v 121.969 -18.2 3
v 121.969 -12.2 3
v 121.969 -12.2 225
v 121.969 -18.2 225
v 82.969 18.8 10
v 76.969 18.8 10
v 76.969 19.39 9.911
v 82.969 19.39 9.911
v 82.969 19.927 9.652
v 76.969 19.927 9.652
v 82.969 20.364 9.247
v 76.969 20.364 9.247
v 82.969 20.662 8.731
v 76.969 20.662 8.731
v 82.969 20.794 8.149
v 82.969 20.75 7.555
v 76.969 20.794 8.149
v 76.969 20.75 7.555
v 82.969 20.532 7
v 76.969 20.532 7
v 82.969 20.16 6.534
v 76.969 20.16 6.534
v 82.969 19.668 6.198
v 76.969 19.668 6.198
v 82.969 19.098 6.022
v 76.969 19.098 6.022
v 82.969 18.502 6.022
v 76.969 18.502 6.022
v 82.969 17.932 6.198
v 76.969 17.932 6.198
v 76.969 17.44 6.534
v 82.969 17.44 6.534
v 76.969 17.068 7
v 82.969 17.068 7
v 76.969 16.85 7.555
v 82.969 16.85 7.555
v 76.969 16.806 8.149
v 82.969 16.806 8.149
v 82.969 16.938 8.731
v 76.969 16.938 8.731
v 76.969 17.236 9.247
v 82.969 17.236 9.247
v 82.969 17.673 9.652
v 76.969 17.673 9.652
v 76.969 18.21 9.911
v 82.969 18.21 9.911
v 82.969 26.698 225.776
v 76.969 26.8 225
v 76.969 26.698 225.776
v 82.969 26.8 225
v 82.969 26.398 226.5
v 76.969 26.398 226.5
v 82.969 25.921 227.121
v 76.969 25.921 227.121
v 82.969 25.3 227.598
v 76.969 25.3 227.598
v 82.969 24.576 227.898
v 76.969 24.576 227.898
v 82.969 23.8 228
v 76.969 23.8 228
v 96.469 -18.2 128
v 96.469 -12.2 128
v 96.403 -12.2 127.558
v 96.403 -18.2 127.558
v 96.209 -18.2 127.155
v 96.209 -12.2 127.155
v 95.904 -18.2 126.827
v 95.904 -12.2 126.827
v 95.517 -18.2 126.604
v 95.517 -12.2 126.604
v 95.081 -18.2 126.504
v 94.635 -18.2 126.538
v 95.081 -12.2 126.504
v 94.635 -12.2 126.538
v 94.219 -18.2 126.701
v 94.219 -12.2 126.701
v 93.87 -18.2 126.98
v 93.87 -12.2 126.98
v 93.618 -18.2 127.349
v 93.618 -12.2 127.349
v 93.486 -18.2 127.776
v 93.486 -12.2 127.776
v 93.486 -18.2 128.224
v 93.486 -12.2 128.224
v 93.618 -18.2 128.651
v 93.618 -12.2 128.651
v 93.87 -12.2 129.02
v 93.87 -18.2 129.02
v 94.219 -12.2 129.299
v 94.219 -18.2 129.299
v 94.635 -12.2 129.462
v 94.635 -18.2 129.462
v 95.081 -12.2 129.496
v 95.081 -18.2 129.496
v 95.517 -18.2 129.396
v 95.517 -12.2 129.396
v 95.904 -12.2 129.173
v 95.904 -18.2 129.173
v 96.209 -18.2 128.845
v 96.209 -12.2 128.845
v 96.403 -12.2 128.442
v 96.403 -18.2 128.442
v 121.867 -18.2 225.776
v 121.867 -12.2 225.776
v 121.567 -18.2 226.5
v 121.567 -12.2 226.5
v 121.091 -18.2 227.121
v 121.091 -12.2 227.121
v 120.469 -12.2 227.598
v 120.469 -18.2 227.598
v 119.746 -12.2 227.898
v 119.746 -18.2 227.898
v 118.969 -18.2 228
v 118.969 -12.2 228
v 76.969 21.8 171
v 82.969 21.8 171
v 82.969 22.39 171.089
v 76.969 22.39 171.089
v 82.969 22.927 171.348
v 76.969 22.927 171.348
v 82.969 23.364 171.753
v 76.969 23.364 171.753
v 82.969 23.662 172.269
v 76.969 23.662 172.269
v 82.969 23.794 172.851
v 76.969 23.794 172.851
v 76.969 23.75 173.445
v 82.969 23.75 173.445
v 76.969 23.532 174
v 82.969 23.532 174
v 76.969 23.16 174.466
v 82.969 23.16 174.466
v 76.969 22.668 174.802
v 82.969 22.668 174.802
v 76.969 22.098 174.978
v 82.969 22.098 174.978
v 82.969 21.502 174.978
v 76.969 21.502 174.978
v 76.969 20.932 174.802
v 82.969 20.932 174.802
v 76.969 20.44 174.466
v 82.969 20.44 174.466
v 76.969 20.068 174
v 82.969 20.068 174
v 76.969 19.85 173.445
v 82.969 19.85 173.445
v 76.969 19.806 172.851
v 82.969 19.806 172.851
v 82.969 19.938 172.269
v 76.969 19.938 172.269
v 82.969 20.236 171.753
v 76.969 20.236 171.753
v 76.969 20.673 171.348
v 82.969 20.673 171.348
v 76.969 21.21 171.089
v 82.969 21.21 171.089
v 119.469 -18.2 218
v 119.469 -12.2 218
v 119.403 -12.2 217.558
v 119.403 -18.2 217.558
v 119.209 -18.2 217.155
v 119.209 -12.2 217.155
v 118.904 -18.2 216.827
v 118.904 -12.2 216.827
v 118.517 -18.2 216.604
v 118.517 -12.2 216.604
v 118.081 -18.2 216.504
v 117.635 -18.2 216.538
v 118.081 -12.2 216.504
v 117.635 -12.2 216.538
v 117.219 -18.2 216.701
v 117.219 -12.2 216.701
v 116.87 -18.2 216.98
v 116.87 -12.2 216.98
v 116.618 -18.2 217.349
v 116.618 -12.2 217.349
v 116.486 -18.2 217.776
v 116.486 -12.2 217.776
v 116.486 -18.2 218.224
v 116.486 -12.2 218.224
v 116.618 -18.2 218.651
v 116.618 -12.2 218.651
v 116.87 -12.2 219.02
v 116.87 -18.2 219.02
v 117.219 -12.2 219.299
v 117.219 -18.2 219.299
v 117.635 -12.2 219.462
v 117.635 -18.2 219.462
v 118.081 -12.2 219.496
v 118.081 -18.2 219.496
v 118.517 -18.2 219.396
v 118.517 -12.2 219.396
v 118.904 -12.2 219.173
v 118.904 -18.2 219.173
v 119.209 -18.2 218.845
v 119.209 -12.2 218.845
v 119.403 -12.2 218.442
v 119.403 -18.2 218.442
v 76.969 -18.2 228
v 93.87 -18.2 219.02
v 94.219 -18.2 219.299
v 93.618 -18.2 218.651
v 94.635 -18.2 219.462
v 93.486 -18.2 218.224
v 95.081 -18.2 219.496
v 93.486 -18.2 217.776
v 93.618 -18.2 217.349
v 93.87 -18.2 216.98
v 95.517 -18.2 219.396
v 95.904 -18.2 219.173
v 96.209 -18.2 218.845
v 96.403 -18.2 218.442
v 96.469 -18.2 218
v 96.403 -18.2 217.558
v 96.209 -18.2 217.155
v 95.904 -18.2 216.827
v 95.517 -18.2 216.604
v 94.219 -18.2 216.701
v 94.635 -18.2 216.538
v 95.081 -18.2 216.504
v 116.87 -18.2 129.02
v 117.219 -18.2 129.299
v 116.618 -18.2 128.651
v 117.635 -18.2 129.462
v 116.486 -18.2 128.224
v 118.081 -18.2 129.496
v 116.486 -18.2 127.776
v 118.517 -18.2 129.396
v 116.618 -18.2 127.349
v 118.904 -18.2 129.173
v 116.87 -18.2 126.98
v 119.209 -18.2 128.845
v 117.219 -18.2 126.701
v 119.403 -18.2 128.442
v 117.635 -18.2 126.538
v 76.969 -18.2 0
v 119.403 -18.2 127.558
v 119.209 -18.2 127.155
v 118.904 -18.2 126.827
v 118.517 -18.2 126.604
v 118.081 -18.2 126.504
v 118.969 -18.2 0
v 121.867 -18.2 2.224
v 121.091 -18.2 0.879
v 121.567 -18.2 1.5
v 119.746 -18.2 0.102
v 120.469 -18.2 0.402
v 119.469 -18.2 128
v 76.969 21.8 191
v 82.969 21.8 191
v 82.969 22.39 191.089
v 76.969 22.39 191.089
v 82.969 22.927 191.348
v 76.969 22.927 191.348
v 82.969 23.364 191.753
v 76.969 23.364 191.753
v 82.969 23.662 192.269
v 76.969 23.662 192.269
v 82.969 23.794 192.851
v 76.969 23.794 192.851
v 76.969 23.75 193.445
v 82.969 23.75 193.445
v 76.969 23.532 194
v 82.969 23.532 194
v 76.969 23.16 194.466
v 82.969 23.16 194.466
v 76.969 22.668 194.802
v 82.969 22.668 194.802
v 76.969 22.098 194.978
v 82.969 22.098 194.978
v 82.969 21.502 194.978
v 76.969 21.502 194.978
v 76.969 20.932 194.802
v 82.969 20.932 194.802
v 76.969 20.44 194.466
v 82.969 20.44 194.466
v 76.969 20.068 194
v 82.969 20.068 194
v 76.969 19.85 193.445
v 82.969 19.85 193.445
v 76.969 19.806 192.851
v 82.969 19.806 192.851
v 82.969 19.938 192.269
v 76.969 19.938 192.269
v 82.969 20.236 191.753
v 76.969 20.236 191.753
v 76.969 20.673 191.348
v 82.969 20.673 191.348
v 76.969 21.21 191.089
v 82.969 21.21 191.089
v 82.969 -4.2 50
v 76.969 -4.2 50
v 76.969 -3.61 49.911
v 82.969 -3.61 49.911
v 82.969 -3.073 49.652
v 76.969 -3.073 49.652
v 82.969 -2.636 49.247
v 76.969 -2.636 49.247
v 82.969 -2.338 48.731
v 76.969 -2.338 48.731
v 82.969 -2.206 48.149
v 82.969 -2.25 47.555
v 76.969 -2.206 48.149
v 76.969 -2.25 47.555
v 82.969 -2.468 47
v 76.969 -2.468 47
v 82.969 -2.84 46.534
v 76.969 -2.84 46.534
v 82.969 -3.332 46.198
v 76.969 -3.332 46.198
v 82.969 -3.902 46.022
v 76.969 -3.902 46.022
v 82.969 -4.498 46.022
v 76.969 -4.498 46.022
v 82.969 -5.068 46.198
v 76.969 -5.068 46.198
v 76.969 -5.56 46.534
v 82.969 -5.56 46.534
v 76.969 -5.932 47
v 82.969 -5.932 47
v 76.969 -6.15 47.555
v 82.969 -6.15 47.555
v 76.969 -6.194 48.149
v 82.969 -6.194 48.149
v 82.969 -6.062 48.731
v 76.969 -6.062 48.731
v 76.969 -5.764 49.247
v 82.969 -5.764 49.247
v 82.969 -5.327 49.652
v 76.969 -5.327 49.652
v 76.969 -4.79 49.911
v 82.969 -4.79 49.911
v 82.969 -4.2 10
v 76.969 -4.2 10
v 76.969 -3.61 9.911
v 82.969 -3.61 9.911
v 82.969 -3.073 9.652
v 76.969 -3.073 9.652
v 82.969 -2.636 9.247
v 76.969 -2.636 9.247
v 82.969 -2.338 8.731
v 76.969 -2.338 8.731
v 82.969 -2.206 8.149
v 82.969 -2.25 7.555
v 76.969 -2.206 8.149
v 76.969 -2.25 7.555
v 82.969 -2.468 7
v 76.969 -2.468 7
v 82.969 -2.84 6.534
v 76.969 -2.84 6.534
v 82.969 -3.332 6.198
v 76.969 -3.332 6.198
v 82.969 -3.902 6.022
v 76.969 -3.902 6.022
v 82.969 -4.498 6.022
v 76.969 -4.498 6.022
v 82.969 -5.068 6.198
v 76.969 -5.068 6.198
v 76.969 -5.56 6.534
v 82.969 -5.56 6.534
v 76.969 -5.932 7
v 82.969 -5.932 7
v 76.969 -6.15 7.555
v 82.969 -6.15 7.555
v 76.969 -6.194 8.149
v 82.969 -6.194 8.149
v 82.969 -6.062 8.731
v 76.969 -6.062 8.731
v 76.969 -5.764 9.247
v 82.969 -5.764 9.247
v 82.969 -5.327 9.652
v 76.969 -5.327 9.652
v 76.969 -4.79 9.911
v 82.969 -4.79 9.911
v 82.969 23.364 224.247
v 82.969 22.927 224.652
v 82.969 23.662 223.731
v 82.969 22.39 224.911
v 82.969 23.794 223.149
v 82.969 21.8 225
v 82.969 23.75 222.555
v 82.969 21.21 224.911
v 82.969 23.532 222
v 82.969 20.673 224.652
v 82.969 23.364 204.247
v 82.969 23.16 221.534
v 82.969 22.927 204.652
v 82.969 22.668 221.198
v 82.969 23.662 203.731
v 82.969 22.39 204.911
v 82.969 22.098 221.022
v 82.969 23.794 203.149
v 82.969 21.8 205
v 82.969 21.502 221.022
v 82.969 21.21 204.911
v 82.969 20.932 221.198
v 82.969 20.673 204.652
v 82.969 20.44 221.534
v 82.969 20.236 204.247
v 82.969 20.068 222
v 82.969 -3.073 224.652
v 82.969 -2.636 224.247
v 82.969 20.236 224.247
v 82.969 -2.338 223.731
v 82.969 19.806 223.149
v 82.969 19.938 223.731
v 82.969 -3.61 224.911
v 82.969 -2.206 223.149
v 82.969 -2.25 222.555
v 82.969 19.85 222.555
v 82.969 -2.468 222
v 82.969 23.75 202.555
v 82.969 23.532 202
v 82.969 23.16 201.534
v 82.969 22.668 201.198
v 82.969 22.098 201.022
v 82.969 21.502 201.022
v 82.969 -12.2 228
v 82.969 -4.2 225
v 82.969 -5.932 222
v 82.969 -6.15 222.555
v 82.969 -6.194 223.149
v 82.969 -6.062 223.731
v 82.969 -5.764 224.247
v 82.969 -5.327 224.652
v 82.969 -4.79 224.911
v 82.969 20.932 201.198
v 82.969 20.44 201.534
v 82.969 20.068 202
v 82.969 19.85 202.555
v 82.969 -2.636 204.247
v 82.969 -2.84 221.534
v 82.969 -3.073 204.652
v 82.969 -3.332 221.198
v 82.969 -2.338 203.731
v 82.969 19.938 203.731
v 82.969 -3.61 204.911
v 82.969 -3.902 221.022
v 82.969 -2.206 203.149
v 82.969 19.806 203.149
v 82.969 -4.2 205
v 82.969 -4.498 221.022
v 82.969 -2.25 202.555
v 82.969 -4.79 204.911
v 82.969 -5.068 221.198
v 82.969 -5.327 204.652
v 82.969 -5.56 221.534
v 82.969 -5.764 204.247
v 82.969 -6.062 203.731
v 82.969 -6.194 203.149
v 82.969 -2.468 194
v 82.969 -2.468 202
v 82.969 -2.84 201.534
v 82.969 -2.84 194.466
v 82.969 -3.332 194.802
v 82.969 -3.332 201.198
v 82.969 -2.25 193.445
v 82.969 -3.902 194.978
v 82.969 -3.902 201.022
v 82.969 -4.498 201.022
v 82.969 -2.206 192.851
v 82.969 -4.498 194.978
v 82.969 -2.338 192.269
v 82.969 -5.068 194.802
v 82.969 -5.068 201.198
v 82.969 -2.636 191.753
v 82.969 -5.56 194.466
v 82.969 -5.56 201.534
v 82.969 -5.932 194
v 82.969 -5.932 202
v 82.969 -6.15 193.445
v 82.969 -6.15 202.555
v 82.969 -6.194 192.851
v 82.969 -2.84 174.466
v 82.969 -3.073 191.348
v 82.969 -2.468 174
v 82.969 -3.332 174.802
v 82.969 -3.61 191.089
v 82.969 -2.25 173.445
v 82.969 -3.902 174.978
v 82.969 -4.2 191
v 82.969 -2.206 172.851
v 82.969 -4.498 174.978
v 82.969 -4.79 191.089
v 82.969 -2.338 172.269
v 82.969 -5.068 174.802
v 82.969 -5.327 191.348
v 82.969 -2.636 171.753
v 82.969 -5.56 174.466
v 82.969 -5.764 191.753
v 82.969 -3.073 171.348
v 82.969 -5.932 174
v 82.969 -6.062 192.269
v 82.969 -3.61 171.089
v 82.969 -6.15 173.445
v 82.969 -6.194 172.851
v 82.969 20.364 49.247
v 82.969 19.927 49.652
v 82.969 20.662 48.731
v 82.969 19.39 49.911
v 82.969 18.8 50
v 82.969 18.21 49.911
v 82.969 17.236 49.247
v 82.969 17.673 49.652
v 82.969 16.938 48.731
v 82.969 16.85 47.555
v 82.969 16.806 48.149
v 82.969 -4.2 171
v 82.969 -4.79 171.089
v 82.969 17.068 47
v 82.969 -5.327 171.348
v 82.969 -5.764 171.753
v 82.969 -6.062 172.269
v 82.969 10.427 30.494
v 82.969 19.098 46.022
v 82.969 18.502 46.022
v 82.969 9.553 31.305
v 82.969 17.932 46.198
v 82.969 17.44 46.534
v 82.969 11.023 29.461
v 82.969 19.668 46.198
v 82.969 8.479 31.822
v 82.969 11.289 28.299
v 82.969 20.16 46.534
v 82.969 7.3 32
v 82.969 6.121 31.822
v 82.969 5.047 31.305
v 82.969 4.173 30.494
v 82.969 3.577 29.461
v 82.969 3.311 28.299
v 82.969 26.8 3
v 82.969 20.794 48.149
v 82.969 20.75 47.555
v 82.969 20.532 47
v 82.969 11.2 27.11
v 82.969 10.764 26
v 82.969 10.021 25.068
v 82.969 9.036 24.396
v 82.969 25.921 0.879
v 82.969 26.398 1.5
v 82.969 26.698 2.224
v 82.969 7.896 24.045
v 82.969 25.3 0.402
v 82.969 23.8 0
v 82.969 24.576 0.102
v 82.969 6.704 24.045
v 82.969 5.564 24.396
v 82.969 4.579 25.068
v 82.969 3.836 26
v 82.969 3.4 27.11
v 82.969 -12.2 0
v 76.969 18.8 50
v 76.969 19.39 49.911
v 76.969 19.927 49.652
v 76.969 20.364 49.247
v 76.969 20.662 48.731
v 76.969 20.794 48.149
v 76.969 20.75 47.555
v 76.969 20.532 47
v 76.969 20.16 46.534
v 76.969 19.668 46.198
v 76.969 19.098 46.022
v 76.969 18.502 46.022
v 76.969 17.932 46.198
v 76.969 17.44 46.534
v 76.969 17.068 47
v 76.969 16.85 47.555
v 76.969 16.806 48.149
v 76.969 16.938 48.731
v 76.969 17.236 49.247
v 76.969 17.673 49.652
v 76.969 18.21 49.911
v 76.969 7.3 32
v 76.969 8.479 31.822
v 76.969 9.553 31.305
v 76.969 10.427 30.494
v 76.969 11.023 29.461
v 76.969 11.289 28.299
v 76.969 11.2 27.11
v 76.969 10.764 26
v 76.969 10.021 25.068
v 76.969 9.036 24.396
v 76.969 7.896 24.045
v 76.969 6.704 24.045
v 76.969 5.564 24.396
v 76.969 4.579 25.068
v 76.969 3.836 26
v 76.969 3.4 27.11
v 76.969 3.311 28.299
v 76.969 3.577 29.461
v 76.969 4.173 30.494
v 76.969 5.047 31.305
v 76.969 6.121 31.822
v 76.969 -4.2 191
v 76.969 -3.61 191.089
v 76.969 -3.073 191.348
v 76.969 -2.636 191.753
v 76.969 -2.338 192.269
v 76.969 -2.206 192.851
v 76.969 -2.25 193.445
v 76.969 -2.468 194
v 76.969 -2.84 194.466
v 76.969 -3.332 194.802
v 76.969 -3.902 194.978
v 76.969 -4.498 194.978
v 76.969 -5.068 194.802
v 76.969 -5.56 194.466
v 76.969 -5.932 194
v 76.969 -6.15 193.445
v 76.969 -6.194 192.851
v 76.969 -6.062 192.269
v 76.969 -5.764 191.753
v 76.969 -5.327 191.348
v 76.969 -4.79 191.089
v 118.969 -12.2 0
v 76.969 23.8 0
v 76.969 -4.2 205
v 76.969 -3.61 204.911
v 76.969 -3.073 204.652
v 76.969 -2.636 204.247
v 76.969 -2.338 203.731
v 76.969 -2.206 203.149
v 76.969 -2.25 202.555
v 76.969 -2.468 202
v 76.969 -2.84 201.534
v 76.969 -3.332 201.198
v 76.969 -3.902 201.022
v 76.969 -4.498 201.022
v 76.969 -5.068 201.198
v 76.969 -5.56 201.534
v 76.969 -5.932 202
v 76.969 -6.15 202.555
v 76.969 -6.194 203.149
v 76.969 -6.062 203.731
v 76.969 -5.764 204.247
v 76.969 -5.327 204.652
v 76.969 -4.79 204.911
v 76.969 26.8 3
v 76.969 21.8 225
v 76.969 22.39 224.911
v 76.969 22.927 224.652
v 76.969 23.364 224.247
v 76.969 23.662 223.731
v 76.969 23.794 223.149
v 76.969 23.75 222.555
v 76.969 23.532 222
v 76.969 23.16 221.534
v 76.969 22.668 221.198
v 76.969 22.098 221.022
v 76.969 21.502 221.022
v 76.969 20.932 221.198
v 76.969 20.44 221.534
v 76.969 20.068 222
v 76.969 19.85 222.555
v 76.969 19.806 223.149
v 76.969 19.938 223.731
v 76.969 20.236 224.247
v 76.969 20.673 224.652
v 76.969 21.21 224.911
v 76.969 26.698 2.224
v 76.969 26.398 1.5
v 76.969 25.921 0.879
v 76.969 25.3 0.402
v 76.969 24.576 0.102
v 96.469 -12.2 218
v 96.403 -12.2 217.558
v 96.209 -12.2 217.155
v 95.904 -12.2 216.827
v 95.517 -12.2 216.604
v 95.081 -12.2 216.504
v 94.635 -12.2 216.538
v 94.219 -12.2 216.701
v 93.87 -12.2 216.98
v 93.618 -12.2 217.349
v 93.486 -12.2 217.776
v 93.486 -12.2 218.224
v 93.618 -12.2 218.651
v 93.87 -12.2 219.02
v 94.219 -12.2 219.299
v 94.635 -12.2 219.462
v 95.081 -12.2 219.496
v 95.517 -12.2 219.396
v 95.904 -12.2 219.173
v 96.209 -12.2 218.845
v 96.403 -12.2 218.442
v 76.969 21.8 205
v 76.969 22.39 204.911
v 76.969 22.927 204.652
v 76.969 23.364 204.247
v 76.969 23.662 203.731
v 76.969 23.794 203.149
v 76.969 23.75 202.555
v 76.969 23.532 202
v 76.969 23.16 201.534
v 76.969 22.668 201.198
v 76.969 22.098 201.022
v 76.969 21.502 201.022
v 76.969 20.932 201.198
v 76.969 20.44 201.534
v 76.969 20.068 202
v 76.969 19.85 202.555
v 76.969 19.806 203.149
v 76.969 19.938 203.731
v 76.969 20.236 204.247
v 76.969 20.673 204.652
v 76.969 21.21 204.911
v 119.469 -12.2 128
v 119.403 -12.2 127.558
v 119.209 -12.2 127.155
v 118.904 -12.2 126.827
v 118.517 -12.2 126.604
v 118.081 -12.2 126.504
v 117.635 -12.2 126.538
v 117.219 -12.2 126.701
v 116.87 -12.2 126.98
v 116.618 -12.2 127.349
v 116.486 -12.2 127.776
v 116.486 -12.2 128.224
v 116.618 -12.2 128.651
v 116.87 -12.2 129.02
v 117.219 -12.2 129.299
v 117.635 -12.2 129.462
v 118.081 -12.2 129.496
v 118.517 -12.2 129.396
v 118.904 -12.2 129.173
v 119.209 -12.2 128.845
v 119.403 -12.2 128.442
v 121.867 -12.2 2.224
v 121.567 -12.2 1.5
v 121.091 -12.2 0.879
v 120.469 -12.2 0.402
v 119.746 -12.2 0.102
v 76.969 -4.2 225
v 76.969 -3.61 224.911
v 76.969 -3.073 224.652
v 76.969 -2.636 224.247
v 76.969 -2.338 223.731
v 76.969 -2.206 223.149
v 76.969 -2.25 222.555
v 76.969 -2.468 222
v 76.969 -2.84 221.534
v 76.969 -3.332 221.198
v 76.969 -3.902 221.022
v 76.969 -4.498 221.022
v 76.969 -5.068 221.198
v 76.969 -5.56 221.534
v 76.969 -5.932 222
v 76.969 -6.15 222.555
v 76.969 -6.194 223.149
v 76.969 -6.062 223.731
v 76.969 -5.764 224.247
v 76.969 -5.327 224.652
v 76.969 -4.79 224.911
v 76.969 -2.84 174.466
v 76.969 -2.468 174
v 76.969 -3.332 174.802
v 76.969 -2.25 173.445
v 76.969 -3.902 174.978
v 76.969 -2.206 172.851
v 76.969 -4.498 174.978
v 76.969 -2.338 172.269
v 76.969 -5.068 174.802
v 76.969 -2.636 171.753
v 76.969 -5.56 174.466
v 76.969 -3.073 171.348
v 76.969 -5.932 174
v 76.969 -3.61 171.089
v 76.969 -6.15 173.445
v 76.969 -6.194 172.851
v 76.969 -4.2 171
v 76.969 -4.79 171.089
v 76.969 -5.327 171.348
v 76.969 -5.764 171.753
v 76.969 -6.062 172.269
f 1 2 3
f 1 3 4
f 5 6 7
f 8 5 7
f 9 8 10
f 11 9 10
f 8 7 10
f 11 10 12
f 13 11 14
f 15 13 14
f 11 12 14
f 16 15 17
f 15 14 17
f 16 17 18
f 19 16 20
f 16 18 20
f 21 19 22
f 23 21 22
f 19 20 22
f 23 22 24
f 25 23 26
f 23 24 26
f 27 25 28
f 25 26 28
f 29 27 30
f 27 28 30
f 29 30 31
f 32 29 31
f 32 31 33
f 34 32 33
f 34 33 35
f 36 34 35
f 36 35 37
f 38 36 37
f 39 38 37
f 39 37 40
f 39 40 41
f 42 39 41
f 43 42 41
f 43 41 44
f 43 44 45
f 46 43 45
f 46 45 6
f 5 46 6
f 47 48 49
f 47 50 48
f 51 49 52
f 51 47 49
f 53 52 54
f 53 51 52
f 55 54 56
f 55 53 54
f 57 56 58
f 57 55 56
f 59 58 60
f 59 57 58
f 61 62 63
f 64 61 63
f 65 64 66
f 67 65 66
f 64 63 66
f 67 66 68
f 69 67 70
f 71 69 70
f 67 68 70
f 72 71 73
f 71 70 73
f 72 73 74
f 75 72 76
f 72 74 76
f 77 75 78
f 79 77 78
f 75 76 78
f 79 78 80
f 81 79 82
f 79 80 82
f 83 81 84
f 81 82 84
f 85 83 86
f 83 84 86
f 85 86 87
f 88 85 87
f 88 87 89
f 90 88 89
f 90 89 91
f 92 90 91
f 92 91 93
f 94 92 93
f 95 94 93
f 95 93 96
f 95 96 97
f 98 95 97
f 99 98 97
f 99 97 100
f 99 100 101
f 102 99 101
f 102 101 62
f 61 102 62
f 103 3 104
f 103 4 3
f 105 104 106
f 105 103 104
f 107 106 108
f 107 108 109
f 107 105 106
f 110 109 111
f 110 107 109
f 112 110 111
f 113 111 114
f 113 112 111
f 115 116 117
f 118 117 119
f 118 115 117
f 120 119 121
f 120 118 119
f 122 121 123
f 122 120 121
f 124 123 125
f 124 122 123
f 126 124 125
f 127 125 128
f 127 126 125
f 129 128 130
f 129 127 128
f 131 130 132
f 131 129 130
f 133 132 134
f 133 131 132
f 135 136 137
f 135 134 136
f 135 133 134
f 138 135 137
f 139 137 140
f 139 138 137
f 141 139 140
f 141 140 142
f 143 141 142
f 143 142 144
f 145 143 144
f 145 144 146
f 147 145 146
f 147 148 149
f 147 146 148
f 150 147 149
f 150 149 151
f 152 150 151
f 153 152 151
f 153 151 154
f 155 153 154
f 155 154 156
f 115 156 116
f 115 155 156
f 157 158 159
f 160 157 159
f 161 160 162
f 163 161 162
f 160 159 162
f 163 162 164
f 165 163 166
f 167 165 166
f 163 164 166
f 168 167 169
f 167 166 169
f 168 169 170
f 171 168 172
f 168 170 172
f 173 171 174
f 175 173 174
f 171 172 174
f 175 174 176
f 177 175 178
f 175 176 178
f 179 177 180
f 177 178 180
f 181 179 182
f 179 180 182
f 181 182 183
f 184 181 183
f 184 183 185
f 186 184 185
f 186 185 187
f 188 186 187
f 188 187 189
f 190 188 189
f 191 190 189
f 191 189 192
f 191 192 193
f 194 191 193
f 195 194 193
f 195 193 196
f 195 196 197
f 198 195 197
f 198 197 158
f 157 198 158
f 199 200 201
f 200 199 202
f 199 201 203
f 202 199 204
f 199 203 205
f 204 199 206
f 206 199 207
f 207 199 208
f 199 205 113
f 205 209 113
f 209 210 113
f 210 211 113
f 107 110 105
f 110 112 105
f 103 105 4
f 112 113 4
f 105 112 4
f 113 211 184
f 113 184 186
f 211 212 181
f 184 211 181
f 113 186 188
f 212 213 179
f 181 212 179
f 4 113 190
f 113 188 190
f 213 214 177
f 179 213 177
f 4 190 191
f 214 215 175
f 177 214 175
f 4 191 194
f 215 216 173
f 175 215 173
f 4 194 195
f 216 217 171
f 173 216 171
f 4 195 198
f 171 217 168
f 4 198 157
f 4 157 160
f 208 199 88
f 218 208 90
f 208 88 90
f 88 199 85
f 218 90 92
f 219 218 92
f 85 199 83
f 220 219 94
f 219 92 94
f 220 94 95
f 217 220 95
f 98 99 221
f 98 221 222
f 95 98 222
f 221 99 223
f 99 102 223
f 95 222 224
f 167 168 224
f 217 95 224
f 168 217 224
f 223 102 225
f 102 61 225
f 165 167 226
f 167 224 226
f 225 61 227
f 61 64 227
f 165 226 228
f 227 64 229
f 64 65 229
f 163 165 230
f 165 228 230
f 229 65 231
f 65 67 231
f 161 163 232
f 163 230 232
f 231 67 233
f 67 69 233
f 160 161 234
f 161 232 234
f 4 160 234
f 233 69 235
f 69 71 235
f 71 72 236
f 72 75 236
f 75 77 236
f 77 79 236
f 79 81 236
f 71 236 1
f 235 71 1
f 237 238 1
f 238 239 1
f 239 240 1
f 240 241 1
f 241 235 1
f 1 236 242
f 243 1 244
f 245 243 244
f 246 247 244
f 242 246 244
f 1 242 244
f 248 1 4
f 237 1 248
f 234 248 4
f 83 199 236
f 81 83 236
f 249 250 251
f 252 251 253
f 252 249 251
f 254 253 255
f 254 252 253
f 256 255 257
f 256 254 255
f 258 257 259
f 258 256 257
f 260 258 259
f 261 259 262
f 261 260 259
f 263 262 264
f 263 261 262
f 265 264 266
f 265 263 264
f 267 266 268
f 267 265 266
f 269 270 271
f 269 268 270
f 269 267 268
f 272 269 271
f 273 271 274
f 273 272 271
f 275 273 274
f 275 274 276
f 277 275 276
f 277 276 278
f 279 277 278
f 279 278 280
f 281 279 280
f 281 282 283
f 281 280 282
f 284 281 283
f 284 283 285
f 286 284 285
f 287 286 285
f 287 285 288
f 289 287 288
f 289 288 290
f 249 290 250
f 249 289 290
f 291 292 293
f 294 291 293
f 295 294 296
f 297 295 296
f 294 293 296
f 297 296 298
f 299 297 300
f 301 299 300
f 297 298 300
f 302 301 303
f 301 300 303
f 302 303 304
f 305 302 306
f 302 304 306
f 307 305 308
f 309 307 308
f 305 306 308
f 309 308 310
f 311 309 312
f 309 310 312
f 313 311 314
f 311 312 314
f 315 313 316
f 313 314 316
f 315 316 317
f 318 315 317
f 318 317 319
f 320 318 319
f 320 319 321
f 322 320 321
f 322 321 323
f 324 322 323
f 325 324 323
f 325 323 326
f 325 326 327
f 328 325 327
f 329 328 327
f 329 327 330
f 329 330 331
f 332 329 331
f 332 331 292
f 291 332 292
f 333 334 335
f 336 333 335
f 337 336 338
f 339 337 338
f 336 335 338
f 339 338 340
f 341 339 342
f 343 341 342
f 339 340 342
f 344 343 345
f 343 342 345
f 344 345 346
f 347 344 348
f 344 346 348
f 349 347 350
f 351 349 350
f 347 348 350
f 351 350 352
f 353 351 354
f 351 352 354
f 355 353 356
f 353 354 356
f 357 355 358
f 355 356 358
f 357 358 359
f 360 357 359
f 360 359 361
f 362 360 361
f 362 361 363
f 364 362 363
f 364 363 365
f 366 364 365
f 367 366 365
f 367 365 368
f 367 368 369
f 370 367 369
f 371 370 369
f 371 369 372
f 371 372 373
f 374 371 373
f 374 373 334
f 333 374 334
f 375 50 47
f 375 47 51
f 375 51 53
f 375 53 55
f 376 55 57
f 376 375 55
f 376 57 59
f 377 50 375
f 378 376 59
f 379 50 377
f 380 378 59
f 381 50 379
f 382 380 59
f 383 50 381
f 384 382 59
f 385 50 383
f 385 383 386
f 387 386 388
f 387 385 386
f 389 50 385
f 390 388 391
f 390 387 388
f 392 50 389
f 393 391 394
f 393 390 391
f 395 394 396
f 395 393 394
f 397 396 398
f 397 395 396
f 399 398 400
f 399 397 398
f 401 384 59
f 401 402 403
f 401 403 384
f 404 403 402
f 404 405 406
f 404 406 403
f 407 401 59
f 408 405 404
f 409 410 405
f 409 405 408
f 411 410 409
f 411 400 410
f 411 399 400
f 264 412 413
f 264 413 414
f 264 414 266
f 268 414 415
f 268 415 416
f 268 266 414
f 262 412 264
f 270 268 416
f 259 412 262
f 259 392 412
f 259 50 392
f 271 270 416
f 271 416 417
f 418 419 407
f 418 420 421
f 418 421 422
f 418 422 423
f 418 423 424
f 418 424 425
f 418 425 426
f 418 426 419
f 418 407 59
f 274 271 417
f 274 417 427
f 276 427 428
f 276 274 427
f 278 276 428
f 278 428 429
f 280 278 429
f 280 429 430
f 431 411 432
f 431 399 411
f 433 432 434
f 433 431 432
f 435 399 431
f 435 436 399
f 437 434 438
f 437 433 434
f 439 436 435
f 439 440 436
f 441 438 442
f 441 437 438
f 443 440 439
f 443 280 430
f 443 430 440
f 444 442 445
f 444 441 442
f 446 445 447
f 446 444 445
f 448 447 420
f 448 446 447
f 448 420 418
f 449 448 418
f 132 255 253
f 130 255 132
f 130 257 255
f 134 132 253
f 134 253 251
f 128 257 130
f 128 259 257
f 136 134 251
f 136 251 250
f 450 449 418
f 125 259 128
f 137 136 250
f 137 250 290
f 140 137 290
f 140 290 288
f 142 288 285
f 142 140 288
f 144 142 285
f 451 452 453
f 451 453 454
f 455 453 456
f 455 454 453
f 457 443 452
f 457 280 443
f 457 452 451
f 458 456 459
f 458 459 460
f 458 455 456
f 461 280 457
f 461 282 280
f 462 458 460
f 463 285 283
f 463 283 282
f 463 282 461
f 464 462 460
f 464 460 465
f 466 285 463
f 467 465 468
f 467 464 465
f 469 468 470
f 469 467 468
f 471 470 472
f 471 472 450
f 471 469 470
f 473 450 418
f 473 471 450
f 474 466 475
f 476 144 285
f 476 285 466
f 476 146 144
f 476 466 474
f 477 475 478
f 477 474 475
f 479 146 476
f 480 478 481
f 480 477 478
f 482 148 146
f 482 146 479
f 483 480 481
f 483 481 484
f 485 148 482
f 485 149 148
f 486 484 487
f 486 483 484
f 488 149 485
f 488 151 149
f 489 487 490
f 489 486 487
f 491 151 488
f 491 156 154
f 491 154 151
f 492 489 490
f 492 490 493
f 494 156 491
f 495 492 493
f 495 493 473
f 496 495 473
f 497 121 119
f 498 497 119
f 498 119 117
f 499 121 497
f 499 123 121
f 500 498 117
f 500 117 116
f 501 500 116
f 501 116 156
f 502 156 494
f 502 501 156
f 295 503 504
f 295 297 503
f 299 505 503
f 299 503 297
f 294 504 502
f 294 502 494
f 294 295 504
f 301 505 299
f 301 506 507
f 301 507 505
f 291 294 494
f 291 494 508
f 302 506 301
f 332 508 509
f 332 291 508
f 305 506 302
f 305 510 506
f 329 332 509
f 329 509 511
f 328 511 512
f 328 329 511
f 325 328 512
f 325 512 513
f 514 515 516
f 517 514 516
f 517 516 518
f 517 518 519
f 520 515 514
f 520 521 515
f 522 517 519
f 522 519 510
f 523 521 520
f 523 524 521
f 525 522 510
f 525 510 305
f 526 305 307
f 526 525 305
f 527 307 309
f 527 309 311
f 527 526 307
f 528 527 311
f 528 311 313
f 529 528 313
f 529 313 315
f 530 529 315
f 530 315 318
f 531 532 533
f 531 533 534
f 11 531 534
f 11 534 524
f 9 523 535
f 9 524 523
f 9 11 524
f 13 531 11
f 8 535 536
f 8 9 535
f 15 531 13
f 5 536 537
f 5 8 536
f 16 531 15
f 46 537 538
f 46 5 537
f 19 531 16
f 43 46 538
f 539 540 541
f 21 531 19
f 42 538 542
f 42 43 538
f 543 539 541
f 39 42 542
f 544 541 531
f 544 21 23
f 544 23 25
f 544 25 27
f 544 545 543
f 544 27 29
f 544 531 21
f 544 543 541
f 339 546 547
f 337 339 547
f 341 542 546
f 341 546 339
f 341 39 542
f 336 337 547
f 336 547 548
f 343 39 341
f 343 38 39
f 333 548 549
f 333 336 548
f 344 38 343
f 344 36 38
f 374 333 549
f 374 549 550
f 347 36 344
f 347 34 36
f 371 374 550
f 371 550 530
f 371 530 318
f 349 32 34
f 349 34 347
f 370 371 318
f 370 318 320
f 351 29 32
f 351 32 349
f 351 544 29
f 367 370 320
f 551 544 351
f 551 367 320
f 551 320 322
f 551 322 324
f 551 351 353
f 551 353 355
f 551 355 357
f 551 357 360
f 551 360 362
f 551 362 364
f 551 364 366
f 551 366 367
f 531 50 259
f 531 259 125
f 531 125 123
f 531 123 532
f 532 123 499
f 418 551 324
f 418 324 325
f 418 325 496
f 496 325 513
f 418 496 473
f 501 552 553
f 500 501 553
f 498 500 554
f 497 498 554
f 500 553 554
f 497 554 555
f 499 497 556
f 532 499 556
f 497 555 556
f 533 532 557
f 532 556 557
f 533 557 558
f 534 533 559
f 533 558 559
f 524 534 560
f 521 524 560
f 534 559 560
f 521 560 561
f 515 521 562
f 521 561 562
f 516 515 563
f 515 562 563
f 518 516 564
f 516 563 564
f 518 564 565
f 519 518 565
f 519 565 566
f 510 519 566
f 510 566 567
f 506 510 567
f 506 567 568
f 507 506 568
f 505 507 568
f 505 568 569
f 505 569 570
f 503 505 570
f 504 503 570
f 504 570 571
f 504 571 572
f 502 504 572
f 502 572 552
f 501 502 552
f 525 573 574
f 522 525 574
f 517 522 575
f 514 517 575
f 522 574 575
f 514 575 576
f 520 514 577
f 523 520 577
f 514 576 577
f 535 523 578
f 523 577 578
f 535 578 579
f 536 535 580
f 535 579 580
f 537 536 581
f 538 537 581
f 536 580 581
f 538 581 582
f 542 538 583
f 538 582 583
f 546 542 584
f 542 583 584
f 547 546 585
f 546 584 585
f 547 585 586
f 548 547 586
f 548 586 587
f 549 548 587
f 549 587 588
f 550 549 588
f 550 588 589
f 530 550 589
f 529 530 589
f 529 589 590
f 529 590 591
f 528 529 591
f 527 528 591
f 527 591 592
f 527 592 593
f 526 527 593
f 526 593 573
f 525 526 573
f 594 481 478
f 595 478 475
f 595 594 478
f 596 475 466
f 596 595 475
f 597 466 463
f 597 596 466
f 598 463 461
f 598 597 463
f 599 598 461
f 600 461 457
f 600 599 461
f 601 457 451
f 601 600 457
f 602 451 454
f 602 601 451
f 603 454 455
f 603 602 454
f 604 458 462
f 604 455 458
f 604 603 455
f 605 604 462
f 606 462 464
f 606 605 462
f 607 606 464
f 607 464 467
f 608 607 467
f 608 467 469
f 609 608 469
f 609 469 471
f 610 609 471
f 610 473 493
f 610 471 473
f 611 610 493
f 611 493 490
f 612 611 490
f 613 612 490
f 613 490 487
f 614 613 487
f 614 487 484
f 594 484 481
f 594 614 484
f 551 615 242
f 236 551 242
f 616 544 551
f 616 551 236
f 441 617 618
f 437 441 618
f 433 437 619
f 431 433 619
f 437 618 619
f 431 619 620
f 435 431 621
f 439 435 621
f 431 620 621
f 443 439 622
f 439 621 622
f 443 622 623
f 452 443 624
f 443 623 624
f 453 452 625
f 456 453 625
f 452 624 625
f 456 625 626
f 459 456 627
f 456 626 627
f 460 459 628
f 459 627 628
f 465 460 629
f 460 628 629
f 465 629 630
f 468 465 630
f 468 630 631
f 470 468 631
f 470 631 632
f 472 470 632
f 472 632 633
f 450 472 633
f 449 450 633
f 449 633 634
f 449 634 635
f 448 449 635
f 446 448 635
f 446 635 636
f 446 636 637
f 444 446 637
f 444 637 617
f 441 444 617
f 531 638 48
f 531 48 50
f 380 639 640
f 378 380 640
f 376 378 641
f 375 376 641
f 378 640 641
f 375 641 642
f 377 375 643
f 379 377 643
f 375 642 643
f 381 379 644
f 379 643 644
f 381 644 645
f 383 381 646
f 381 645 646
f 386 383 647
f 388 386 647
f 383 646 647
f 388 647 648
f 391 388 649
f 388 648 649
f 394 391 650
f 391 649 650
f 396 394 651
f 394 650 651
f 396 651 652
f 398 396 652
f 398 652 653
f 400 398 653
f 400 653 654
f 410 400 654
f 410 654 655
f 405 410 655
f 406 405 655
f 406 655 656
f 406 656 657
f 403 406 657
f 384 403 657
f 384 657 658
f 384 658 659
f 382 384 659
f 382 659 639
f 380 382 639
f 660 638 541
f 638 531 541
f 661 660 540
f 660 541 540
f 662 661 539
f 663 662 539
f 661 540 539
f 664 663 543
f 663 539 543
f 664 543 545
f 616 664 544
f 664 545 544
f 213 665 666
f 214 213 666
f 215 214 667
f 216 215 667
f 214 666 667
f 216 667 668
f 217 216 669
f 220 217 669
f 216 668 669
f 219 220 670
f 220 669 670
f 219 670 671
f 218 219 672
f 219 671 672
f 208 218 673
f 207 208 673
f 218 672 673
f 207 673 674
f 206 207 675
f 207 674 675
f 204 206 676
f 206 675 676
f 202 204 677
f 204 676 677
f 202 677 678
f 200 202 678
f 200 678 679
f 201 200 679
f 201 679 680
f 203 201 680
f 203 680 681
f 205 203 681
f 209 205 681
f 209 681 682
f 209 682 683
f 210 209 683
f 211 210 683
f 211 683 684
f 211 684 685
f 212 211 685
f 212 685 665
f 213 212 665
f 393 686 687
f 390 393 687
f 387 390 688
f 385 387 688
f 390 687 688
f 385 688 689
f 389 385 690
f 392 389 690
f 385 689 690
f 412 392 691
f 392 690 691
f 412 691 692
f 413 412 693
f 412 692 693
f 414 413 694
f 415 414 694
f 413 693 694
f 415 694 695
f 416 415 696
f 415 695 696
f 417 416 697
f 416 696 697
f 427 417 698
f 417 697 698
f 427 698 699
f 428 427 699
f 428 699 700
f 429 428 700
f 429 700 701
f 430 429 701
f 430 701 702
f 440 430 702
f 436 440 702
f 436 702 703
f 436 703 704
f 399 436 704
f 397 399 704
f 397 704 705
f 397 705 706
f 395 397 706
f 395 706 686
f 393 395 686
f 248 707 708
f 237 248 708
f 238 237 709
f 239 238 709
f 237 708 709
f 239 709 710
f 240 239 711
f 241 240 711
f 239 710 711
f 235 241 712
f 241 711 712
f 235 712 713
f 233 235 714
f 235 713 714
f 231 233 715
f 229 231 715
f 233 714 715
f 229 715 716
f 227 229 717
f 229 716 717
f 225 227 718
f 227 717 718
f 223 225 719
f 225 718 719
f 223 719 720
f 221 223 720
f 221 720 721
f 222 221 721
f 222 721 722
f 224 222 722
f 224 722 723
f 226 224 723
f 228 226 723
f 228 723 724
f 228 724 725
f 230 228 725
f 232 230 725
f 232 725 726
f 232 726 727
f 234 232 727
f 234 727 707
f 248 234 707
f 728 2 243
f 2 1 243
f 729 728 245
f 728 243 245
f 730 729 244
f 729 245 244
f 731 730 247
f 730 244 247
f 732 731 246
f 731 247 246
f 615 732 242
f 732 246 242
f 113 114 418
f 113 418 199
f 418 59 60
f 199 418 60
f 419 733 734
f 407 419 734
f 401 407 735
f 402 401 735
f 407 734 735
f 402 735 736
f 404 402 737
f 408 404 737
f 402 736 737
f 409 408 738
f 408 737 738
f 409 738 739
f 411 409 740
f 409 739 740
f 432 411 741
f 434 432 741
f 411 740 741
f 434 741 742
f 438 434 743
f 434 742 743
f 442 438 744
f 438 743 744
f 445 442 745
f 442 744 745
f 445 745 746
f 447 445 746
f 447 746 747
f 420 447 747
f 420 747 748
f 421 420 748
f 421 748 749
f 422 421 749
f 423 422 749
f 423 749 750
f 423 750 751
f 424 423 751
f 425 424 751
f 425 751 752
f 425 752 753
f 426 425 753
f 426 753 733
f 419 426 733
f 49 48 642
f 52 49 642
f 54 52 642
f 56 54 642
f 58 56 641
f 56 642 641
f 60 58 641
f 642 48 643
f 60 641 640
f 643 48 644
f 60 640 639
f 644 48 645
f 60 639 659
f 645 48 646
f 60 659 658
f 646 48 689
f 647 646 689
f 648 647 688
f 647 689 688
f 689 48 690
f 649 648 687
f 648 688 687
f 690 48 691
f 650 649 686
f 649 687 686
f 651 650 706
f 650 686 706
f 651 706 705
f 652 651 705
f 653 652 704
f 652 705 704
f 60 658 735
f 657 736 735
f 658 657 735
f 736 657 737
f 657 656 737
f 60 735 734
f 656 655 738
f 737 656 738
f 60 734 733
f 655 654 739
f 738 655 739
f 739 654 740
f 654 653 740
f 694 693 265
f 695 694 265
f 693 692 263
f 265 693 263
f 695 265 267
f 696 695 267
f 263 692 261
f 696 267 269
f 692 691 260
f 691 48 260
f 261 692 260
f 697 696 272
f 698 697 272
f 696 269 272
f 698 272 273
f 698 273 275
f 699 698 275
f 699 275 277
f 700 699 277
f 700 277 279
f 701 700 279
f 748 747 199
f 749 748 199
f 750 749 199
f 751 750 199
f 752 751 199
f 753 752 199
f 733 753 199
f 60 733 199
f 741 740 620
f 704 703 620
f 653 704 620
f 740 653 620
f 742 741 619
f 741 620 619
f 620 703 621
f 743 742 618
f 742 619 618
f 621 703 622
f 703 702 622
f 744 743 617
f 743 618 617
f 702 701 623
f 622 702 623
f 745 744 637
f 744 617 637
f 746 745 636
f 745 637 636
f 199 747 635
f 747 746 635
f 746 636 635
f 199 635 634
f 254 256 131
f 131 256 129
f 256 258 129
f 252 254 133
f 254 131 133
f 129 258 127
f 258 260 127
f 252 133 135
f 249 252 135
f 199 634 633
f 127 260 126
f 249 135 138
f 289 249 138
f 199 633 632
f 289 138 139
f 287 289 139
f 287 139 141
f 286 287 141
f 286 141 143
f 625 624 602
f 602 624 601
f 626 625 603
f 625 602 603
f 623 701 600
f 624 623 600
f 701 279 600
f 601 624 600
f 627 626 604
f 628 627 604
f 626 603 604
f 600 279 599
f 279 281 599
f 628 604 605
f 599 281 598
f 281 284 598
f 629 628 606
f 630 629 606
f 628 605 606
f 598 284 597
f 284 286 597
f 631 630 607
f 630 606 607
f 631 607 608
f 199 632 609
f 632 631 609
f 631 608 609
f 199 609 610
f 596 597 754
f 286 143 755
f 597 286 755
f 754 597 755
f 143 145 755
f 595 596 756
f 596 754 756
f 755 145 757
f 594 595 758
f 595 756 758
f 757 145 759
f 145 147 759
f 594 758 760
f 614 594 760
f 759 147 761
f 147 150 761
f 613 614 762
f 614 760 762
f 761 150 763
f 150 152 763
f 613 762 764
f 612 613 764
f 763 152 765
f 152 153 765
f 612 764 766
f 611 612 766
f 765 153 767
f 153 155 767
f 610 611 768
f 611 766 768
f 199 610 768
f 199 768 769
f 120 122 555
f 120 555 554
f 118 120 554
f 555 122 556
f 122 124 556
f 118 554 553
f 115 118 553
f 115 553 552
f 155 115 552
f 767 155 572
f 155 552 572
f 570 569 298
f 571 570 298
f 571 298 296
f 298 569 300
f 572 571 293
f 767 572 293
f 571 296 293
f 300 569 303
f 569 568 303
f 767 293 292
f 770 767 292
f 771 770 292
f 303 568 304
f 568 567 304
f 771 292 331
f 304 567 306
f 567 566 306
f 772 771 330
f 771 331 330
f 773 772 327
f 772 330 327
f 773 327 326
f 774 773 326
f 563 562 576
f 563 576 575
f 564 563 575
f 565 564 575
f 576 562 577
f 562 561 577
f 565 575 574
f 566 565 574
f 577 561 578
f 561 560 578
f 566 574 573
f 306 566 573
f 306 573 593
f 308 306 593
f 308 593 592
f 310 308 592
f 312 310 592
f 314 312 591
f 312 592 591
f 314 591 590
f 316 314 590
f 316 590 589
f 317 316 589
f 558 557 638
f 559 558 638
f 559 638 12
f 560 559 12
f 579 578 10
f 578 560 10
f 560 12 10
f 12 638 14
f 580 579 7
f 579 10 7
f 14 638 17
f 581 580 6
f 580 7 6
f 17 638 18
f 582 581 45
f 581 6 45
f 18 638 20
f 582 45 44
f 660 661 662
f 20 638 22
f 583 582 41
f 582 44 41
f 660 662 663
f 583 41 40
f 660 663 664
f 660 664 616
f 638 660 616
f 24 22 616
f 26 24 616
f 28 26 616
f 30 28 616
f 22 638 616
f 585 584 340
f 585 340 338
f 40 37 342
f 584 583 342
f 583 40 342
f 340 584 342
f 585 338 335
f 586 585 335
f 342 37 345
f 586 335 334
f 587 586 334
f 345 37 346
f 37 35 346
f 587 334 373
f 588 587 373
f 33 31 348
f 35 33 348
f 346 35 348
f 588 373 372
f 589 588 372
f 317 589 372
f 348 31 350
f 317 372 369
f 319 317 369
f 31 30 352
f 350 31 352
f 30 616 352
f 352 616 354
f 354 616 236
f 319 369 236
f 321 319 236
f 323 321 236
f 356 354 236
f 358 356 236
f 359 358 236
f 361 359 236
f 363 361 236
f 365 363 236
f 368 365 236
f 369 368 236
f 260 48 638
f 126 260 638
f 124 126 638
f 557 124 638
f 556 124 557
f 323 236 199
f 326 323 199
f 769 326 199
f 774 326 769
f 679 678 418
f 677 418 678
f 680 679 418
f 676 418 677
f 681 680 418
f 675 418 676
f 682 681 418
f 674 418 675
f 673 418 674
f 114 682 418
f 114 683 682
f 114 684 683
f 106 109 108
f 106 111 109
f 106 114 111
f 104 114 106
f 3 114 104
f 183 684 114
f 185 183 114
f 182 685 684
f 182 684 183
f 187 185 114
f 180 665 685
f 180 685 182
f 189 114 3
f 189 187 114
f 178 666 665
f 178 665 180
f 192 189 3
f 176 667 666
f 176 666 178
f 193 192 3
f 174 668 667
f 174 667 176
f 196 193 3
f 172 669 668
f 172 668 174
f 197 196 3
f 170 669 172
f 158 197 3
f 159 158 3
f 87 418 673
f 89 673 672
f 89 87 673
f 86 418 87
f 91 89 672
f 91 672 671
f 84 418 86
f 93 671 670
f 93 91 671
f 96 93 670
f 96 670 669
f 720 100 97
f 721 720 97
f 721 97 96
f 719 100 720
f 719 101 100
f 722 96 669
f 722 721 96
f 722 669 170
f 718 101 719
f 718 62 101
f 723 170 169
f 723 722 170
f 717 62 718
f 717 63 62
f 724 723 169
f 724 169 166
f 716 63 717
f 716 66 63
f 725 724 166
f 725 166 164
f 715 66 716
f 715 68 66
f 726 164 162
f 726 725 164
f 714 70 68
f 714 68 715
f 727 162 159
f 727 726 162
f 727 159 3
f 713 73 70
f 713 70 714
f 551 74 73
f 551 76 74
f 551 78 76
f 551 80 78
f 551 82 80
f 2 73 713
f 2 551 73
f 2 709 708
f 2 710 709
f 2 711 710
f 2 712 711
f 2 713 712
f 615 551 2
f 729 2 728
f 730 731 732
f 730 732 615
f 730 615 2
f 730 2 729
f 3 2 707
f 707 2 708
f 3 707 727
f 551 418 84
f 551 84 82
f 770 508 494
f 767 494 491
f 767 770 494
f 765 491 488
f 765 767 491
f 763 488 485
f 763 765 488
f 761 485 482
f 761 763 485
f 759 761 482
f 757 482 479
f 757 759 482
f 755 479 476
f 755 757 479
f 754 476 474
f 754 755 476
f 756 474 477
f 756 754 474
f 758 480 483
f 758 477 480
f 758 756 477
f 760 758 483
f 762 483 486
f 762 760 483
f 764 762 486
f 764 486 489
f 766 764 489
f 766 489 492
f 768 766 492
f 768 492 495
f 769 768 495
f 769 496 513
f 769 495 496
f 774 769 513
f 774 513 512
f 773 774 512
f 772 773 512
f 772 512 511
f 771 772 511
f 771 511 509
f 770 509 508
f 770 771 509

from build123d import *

# Parameters (mm, degrees)
BOSS_EXTRUDE1_DEPTH = 228
FILLET1_R           = 3
SKETCH5_R           = 2
CUT_EXTRUDE2_DEPTH  = 46
SKETCH6_R           = 2
CUT_EXTRUDE3_DEPTH  = 46
SKETCH7_R           = 4
CUT_EXTRUDE4_DEPTH  = 46
SKETCH8_R           = 1.5
CUT_EXTRUDE5_DEPTH  = 7


with BuildPart() as part:
    # Sketch2 → Boss-Extrude1 (new body)
    with BuildSketch(Plane.XY):
        Polygon((82.969208633, 26.8), (82.969208633, -12.2), (121.969208633, -12.2), (121.969208633, -18.2), (82.969208633, -18.2), (76.969208633, -18.2), (76.969208633, -12.2), (76.969208633, 26.8), align=None)
    extrude(amount=BOSS_EXTRUDE1_DEPTH)

    # Fillet1
    fillet1_edges = [part.edges().sort_by_distance(p)[0] for p in [
        (79.969208633, 26.8, 0),
        (121.969208633, -15.2, 228),
        (79.969208633, 26.8, 228),
        (121.969208633, -15.2, 0),
    ]]
    fillet(fillet1_edges, radius=FILLET1_R)

    # Sketch5 → Cut-Extrude2 (cut, through all)
    with BuildSketch(Plane.ZY.offset(-76.969208633)):
        with Locations((223, 21.8)):
            Circle(SKETCH5_R)
        with Locations((223, -4.2)):
            Circle(SKETCH5_R)
        with Locations((203, 21.8)):
            Circle(SKETCH5_R)
        with Locations((203, -4.2)):
            Circle(SKETCH5_R)
    cut_extrude2 = extrude(amount=-CUT_EXTRUDE2_DEPTH, mode=Mode.SUBTRACT)

    # Mirror1: Cut-Extrude2 across plane
    add(cut_extrude2.mirror(Plane.XY.offset(198)), mode=Mode.SUBTRACT)

    # Sketch6 → Cut-Extrude3 (cut, through all)
    with BuildSketch(Plane.ZY.offset(-76.969208633)):
        with Locations((8, 18.8)):
            Circle(SKETCH6_R)
        with Locations((48, 18.8)):
            Circle(SKETCH6_R)
        with Locations((8, -4.2)):
            Circle(SKETCH6_R)
        with Locations((48, -4.2)):
            Circle(SKETCH6_R)
    extrude(amount=-CUT_EXTRUDE3_DEPTH, mode=Mode.SUBTRACT)

    # Sketch7 → Cut-Extrude4 (cut, through all)
    with BuildSketch(Plane.ZY.offset(-76.969208633)):
        with Locations((28, 7.3)):
            Circle(SKETCH7_R)
    extrude(amount=-CUT_EXTRUDE4_DEPTH, mode=Mode.SUBTRACT)

    # Sketch8 → Cut-Extrude5 (cut, through all)
    with BuildSketch(Plane(origin=(0, -12.2, 0), x_dir=(1, 0, 0), z_dir=(0, 1, 0))):
        with Locations((94.969208633, -218)):
            Circle(SKETCH8_R)
        with Locations((117.969208633, -218)):
            Circle(SKETCH8_R)
        with Locations((117.969208633, -128)):
            Circle(SKETCH8_R)
        with Locations((94.969208633, -128)):
            Circle(SKETCH8_R)
    extrude(amount=-CUT_EXTRUDE5_DEPTH, mode=Mode.SUBTRACT)


solid = part.part
